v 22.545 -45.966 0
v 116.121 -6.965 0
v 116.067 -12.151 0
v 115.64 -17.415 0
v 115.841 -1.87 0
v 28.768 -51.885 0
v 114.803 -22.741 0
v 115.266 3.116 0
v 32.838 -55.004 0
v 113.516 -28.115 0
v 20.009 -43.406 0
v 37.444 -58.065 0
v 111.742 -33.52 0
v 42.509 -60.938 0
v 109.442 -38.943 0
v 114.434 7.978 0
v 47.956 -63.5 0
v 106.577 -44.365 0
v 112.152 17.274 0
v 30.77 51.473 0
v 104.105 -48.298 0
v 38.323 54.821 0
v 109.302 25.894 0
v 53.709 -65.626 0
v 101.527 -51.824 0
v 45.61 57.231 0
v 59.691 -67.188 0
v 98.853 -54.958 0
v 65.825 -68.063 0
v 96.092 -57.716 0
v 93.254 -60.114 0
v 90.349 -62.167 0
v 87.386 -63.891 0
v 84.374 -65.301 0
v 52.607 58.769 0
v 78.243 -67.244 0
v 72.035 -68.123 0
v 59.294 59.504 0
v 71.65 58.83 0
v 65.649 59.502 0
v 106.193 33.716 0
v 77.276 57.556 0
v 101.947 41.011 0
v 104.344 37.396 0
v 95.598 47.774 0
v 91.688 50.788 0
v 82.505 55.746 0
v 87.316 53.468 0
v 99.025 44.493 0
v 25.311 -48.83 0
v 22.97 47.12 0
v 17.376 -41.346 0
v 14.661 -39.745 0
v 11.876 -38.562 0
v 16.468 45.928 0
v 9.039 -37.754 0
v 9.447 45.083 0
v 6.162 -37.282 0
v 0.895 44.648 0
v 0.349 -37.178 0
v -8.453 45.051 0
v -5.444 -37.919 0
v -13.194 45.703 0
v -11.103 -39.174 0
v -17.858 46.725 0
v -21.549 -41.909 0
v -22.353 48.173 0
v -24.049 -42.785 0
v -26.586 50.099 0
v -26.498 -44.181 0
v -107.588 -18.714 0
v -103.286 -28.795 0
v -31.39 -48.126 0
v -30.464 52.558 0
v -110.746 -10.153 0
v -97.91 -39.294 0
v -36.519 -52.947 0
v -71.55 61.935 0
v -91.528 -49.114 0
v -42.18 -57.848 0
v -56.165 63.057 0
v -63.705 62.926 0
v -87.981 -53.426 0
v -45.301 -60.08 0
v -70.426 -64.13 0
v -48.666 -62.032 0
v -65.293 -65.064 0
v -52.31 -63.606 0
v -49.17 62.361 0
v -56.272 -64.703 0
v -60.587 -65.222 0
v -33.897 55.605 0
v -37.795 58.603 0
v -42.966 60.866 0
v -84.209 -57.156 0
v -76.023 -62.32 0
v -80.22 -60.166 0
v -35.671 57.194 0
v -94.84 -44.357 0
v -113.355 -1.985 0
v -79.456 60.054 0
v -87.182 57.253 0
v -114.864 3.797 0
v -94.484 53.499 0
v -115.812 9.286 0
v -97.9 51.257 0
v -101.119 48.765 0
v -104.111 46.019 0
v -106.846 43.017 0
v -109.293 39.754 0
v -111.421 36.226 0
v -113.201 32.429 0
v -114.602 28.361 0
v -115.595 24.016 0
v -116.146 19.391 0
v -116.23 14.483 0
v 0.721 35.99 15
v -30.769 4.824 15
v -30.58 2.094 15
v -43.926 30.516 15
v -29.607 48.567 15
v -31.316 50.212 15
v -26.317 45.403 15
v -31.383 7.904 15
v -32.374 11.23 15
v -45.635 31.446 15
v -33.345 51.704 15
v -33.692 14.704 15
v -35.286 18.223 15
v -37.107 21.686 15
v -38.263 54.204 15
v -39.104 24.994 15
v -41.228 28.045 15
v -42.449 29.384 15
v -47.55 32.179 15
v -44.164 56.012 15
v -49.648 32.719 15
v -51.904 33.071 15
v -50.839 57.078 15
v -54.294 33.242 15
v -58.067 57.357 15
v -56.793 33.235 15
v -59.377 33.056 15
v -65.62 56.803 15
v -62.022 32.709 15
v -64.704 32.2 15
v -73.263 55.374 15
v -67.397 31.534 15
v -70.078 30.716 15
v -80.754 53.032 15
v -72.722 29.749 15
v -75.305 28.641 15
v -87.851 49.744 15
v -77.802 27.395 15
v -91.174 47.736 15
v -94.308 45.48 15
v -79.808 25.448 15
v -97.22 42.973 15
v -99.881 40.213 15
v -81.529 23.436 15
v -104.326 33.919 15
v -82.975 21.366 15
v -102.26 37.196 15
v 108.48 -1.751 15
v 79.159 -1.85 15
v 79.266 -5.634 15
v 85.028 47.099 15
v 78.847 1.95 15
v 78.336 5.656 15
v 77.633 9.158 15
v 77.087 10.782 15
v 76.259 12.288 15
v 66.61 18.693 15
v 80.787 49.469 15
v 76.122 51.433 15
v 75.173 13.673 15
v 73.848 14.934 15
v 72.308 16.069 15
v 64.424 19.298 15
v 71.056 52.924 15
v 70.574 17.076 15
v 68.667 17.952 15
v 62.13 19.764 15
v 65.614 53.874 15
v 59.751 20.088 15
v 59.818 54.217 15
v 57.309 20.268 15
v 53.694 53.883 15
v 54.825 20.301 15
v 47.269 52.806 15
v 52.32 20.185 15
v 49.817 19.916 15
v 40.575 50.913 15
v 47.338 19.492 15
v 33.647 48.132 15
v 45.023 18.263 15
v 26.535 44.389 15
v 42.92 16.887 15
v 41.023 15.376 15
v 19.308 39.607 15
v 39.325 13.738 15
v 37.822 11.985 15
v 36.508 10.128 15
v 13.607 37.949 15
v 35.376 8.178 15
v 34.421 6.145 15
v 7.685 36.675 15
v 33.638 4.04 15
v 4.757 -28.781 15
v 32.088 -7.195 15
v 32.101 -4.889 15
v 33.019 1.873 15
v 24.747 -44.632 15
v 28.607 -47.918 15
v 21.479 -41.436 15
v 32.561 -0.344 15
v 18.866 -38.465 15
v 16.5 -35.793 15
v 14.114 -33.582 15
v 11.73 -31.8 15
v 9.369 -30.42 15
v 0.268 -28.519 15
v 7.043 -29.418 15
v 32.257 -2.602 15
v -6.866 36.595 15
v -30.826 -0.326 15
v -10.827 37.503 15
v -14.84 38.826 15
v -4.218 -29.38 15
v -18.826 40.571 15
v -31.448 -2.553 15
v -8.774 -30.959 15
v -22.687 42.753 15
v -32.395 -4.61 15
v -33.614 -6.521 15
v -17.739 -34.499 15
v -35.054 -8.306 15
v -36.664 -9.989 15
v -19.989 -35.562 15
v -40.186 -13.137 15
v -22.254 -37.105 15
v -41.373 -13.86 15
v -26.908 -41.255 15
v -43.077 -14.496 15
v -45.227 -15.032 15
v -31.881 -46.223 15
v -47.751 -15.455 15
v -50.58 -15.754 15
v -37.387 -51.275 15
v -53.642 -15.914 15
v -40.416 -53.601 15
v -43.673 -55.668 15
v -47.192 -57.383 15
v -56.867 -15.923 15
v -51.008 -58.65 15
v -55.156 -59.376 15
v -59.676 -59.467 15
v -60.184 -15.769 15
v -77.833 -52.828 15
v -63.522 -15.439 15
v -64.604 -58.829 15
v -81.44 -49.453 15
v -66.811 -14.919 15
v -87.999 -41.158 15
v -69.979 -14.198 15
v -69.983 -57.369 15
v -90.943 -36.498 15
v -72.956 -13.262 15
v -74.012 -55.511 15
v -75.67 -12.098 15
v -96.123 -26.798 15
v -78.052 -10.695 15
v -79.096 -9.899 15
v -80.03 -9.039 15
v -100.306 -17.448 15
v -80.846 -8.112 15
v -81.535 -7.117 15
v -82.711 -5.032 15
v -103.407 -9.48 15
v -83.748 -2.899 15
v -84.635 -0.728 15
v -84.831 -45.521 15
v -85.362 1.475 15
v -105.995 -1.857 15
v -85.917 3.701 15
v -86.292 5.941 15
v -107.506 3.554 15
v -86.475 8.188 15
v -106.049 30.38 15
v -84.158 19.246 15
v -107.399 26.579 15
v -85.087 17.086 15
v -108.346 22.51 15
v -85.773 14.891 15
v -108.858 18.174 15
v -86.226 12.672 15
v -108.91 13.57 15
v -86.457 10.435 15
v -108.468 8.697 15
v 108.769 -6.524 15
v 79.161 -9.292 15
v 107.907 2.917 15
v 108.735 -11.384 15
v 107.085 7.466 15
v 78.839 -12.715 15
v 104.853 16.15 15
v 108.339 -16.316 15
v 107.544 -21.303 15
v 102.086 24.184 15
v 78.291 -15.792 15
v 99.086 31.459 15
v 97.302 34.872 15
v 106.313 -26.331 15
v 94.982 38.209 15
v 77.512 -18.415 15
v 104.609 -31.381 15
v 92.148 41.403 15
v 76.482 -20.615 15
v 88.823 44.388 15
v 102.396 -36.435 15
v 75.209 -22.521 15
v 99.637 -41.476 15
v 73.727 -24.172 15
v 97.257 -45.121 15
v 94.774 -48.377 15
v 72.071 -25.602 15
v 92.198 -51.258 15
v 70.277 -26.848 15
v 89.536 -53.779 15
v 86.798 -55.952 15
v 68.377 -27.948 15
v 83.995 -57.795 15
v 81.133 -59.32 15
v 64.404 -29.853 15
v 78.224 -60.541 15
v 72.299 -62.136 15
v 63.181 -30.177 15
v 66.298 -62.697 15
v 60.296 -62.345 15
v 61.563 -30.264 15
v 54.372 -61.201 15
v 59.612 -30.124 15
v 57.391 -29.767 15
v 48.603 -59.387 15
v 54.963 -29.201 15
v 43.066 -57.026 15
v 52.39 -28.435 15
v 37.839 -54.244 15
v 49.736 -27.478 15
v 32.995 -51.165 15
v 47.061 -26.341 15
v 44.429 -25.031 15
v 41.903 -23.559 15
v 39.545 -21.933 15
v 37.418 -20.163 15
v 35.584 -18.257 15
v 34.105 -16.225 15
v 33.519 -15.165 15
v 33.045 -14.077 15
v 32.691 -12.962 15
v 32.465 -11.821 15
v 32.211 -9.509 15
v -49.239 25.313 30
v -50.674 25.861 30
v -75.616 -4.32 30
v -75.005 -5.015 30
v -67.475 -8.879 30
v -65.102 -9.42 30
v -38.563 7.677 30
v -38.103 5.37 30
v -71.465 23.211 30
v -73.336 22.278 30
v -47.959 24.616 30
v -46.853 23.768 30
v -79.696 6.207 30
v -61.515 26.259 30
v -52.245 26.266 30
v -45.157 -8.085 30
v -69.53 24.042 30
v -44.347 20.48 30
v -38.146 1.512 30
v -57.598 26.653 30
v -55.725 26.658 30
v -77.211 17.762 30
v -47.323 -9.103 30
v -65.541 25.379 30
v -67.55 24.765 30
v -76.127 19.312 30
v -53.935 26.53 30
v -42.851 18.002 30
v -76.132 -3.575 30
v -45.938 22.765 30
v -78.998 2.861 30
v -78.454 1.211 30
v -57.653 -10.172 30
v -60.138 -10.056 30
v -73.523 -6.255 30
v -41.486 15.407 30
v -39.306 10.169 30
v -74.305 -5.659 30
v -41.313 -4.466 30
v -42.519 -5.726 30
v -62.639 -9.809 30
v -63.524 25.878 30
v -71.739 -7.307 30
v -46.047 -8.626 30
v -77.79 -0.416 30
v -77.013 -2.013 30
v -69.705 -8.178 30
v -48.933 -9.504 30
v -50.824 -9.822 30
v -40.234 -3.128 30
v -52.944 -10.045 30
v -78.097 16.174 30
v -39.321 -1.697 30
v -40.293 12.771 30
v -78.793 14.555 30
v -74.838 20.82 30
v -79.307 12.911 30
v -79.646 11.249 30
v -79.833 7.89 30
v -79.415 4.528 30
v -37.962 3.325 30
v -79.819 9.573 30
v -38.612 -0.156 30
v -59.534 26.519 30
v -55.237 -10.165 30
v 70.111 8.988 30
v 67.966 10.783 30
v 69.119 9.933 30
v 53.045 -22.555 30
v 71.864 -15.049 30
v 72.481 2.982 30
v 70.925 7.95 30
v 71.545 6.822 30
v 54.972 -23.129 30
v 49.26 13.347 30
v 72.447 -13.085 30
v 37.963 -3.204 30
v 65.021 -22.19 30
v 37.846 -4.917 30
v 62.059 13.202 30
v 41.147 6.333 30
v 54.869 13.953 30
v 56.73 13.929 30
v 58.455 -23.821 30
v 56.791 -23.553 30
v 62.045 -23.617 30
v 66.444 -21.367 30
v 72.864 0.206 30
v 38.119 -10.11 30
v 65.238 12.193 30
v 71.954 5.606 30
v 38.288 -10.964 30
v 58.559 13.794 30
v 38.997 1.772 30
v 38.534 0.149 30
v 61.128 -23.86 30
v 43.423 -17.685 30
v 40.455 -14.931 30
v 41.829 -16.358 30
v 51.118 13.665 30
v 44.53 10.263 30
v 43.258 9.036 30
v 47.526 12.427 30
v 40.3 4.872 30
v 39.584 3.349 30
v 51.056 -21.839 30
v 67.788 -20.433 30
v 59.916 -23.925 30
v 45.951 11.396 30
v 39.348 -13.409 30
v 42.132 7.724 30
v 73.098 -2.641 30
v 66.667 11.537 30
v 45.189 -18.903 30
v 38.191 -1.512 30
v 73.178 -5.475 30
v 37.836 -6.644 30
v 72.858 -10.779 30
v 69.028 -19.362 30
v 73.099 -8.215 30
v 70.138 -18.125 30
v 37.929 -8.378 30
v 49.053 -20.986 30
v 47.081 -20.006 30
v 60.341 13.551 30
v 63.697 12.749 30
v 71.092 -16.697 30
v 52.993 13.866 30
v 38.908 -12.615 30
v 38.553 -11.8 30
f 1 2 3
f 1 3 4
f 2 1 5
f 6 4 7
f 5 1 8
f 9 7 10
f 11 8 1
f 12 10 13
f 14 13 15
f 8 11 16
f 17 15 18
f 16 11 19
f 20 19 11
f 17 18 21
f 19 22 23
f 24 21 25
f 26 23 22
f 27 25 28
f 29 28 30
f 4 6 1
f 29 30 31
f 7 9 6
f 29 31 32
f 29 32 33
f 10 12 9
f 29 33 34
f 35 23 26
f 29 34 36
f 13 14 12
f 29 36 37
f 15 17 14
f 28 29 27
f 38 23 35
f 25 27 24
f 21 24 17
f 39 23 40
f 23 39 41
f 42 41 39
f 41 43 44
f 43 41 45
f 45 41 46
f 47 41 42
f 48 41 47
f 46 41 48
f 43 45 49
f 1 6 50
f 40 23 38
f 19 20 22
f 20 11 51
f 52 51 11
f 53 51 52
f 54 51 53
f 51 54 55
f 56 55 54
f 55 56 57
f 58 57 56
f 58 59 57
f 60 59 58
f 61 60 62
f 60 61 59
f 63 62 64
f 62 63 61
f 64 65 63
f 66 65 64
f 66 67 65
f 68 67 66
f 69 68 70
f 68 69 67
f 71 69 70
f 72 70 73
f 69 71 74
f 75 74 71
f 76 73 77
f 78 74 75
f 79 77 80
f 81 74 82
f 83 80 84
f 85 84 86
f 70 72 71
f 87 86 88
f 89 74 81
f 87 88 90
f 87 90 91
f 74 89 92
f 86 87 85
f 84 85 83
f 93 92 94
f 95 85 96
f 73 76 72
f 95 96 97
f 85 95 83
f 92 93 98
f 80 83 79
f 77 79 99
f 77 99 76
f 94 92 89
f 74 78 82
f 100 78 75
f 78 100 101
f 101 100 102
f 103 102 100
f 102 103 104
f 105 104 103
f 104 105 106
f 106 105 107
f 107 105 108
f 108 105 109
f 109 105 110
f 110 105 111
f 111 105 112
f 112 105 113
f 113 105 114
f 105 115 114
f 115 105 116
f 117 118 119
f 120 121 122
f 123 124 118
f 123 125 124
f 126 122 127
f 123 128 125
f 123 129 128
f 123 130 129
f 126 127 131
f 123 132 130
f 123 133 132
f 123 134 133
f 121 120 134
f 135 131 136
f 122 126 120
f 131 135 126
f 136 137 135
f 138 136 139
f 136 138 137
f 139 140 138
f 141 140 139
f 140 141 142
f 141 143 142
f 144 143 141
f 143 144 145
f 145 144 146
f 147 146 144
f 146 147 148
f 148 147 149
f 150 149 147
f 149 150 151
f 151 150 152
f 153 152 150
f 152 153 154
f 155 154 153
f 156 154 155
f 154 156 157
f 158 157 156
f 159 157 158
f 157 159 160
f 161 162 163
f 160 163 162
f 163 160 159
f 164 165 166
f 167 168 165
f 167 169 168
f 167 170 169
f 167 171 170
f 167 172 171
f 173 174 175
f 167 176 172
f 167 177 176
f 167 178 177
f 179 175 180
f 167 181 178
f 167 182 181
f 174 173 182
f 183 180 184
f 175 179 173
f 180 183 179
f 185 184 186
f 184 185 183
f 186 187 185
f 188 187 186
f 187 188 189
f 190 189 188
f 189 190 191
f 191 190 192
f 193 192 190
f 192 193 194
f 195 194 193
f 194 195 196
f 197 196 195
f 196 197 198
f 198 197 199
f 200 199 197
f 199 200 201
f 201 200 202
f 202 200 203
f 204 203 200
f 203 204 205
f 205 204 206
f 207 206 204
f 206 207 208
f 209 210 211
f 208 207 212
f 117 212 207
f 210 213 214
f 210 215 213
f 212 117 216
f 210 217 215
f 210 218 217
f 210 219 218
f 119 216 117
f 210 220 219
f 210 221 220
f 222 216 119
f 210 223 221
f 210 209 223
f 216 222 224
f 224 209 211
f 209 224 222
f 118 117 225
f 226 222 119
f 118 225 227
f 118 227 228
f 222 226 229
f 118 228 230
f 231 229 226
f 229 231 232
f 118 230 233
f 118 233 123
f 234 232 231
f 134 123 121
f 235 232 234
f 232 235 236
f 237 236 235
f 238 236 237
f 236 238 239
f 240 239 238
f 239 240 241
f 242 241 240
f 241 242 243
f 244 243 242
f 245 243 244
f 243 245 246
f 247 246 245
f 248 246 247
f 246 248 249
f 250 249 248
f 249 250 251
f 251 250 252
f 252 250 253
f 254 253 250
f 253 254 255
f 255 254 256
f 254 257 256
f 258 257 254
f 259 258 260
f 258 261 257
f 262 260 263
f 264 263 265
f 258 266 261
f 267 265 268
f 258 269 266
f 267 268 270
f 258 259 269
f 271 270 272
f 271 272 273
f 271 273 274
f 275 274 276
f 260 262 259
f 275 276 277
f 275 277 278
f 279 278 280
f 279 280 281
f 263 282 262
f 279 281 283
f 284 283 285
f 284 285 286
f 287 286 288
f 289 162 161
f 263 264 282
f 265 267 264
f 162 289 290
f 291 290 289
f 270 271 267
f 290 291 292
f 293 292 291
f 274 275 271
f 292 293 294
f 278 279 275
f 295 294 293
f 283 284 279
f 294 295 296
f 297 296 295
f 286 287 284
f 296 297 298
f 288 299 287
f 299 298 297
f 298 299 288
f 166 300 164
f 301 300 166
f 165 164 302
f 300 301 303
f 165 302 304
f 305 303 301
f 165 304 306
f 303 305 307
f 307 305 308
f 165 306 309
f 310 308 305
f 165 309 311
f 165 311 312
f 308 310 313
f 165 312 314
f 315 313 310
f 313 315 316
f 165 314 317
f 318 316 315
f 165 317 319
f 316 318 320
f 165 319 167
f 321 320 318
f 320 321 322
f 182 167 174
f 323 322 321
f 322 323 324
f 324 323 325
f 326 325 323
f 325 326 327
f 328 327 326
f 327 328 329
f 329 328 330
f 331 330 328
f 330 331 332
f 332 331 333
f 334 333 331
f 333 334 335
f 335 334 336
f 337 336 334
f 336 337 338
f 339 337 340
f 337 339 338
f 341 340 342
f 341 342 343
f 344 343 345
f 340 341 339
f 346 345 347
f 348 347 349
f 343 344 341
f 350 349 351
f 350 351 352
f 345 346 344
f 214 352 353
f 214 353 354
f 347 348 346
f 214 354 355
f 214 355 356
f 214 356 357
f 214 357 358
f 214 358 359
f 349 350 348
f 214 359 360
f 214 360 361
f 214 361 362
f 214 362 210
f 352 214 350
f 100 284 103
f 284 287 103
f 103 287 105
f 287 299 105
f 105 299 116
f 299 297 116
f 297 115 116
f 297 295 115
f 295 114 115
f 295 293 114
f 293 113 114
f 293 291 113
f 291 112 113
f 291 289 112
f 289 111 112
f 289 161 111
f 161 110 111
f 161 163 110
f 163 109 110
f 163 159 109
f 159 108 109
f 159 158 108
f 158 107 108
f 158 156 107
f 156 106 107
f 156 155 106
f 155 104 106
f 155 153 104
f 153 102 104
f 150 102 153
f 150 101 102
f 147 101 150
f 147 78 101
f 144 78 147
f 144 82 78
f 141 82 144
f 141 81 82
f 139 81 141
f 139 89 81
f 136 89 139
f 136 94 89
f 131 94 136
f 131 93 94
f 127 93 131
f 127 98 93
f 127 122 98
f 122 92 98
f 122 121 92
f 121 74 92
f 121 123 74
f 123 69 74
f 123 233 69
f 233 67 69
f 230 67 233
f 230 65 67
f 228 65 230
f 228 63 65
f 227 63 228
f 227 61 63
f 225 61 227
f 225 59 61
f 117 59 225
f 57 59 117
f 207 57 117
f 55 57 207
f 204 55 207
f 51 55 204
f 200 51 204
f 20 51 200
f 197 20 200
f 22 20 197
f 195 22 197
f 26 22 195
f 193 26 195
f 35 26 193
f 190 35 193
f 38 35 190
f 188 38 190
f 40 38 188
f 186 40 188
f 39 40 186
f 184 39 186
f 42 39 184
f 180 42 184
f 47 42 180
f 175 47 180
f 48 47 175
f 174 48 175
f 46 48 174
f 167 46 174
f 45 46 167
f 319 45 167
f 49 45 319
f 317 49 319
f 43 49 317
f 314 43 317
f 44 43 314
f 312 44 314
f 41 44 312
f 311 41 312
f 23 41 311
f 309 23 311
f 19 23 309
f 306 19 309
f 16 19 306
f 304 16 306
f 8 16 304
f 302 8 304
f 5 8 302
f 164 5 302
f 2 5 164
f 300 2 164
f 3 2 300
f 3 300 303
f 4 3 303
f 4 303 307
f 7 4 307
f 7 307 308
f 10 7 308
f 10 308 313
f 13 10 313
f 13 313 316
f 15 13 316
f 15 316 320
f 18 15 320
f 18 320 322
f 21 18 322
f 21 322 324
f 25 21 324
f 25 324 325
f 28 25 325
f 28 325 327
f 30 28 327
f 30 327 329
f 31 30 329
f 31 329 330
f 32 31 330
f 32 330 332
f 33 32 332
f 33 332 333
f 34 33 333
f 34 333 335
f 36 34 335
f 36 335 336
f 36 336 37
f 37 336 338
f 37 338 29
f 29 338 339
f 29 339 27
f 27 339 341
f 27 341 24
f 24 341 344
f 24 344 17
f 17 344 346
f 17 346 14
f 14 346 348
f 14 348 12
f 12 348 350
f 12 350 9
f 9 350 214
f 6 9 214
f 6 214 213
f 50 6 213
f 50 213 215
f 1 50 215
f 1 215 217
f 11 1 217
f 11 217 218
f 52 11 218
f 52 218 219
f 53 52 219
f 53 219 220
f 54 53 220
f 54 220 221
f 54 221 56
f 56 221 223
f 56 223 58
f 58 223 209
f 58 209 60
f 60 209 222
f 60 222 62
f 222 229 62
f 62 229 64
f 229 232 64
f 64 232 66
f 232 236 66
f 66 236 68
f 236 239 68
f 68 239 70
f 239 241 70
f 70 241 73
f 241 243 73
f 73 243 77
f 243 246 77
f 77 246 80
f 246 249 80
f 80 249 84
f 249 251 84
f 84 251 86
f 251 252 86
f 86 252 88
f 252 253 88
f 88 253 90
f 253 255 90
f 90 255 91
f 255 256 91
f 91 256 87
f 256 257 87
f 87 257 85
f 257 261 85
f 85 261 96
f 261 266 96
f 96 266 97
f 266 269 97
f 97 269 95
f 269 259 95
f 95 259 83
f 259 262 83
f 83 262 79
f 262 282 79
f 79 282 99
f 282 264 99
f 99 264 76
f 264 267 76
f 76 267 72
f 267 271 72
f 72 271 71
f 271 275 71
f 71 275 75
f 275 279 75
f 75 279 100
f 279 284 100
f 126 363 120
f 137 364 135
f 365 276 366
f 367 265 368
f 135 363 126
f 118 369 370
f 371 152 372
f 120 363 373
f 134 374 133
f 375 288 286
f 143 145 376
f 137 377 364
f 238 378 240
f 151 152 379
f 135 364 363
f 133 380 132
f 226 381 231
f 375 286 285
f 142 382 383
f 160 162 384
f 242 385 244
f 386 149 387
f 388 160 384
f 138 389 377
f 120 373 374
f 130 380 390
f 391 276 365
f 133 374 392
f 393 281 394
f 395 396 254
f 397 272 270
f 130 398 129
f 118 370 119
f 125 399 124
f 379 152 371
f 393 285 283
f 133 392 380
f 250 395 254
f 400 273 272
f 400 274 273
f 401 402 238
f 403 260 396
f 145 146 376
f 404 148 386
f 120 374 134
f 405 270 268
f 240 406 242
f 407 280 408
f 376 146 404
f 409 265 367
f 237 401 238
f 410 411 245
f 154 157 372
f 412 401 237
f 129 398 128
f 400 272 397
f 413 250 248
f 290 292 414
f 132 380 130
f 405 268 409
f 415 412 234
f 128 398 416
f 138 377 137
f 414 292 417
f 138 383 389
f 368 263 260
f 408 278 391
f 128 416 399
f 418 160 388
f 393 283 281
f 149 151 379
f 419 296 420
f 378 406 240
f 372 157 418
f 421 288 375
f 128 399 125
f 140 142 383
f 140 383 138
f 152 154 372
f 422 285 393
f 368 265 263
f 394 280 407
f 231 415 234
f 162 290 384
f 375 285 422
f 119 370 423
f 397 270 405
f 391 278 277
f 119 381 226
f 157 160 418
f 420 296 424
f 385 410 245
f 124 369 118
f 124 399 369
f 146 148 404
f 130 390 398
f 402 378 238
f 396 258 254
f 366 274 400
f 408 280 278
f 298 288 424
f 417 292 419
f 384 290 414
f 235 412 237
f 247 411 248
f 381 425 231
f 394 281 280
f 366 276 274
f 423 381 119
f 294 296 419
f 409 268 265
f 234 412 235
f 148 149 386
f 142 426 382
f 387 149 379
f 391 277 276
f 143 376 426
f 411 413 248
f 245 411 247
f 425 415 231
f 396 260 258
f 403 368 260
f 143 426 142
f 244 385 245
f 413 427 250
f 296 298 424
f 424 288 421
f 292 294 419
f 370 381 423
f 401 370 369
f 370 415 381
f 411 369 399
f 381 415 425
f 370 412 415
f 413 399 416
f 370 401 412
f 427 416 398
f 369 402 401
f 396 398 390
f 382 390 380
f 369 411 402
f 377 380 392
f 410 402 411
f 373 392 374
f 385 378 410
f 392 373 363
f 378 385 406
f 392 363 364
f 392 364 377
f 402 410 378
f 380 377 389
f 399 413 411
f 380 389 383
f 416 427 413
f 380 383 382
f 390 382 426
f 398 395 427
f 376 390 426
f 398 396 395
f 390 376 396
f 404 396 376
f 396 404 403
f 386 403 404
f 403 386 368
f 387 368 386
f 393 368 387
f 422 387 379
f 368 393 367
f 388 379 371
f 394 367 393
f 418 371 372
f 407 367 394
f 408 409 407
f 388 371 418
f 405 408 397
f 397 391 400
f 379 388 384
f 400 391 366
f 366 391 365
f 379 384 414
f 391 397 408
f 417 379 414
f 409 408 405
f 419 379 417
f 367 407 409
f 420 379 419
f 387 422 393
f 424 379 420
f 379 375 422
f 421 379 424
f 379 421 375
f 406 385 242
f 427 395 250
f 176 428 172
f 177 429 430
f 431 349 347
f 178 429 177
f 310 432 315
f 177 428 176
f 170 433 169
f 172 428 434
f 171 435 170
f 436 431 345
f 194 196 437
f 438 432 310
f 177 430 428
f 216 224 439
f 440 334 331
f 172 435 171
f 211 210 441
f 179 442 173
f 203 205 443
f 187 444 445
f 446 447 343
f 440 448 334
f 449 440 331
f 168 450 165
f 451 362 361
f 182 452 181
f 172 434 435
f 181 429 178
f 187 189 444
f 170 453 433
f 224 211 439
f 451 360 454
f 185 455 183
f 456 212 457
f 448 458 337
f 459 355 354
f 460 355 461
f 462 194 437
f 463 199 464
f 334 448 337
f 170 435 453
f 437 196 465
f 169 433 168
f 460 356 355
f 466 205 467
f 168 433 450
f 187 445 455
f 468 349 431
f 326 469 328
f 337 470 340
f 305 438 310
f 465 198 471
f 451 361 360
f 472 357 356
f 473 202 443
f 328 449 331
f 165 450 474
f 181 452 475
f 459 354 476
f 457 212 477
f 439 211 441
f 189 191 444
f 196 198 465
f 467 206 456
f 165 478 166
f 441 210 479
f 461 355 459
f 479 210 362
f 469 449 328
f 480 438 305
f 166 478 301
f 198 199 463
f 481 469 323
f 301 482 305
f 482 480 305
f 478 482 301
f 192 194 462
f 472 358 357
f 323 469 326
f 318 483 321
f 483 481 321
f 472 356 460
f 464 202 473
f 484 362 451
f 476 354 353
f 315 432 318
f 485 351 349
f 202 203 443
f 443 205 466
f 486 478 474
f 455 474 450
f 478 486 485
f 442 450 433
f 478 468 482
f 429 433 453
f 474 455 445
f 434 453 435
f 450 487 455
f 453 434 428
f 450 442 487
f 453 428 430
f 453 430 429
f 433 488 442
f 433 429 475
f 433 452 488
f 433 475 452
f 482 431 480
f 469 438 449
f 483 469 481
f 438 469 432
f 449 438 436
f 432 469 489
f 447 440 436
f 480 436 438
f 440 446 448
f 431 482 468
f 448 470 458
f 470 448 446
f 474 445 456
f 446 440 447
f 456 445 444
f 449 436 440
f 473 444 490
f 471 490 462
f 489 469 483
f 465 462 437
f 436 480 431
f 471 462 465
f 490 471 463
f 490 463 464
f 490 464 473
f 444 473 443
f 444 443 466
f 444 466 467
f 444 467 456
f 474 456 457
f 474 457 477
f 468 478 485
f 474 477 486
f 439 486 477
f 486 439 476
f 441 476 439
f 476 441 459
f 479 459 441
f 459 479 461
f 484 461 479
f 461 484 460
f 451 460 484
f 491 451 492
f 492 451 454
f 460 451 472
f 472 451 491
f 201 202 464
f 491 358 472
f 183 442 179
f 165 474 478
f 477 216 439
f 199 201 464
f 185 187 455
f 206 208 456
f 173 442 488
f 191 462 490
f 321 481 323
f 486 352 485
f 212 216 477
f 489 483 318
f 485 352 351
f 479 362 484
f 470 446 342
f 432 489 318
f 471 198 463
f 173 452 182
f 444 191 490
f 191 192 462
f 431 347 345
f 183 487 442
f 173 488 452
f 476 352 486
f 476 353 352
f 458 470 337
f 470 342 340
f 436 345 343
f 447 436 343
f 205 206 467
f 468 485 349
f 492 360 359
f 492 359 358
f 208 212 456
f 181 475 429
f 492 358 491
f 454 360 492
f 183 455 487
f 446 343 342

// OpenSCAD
// file: hill-4.scad
use <hillpolygon.scad>

% translate([0,0,155/2]) cube(size=[240, 153, 155], center=true); 

hill4();

module hill4() {
   hillFromPolygon(angle=25) hill4Polygon();
}

// Note: There is something slightly amiss with this polygon, resulting hill ends up with two
//       volumes (?).
module hill4Polygon() {
   // Apologies for the hackish adjustments ... just wanted to get the job done!
   translate([-10,0,0]) rotate([0,0,55]) translate([75,-10,0]) scale([0.8,0.8]) 
      polygon(points=
         [[-140.478, 124.045], [-137.230, 125.810], [-133.814, 127.261],
         [-130.249, 128.407], [-126.551, 129.260], [-118.827, 130.135],
         [-110.782, 129.975], [-102.554, 128.873], [-94.282, 126.918],
         [-86.104, 124.202], [-78.161, 120.815], [-70.590, 116.849],
         [-63.530, 112.395], [-57.120, 107.543], [-51.500, 102.384],
         [-46.807, 97.010], [-43.182, 91.511], [-40.761, 85.978], [-40.047,
         83.228], [-39.685, 80.503], [-38.803, 70.788], [-37.372, 61.707],
         [-35.232, 53.266], [-32.221, 45.469], [-30.339, 41.813], [-28.180,
         38.321], [-25.722, 34.993], [-22.947, 31.830], [-19.833, 28.831],
         [-16.361, 25.998], [-12.511, 23.332], [-8.262, 20.833], [-3.699,
         18.030], [1.024, 14.503], [5.824, 10.330], [10.615, 5.590],
         [15.315, 0.361], [19.839, -5.279], [24.103, -11.252], [28.023,
         -17.479], [31.515, -23.882], [34.496, -30.382], [36.880, -36.903],
         [38.583, -43.364], [39.523, -49.689], [39.615, -55.798], [38.774,
         -61.614], [36.917, -67.058], [35.046, -70.725], [32.867, -74.217],
         [30.379, -77.524], [27.585, -80.639], [24.484, -83.556], [21.077,
         -86.264], [17.366, -88.758], [13.350, -91.029], [9.031, -93.069],
         [4.409, -94.871], [-0.514, -96.427], [-5.739, -97.729], [-11.264,
         -98.769], [-17.089, -99.539], [-23.213, -100.032], [-29.635,
         -100.240], [-39.310, -100.153], [-48.272, -99.722], [-56.565,
         -98.983], [-64.233, -97.967], [-71.320, -96.710], [-77.870,
         -95.245], [-89.537, -91.828], [-99.587, -87.986], [-108.374,
         -83.990], [-123.572, -76.623], [-129.392, -73.760], [-134.677,
         -70.651], [-139.458, -67.328], [-143.761, -63.822], [-147.618,
         -60.167], [-151.056, -56.395], [-154.105, -52.536], [-156.794,
         -48.625], [-161.207, -40.769], [-164.527, -33.084], [-166.987,
         -25.828], [-168.818, -19.258], [-170.193, -13.243], [-171.281,
         -6.864], [-172.108, 0.055], [-172.700, 7.691], [-173.288,
         25.811], [-173.262, 48.900], [-173.153, 59.445], [-172.757,
         69.740], [-171.648, 79.745], [-170.692, 84.627], [-169.398,
         89.422], [-167.713, 94.124], [-165.583, 98.729], [-162.955,
         103.233], [-159.776, 107.629], [-155.992, 111.913], [-151.550,
         116.081], [-146.396, 120.126], [-140.478, 124.045]]
      , paths=
         [[0, 1, 2, 3, 4, 5, 6, 7, 8, 9, 10, 11, 12, 13, 14, 15, 16, 17,
         18, 19, 20, 21, 22, 23, 24, 25, 26, 27, 28, 29, 30, 31, 32, 33,
         34, 35, 36, 37, 38, 39, 40, 41, 42, 43, 44, 45, 46, 47, 48, 49,
         50, 51, 52, 53, 54, 55, 56, 57, 58, 59, 60, 61, 62, 63, 64, 65,
         66, 67, 68, 69, 70, 71, 72, 73, 74, 75, 76, 77, 78, 79, 80, 81,
         82, 83, 84, 85, 86, 87, 88, 89, 90, 91, 92, 93, 94, 95, 96, 97,
         98, 99, 100, 101, 102, 103, 104, 0]]
    );}
// file: hill-5.scad
use <hillpolygon.scad>;

% translate([0,0,155/2]) cube(size=[240, 153, 155], center=true);

hill5();

module hill5() {
   hillFromPolygon(angle=25) hill5Polygon();
}

module hill5Polygon() {
	rotate([0,0,30]) translate([55,-15,0])
  polygon(points=
    [[-39.685, 80.503], [-33.602, 77.830], [-27.700, 74.829], [-22.013, 71.501], [-16.577, 67.848], [-11.425, 63.870], [-6.592, 59.569], [-2.114, 54.944], [1.976, 49.998], [5.642, 44.731], [8.851, 39.145], [11.567, 33.240], [13.756, 27.017], [15.384, 20.477], [16.415, 13.623], [16.815, 6.453], [16.549, -1.030], [14.055, -7.770], [11.144, -14.347], [7.855, -20.711], [4.224, -26.811], [0.290, -32.597], [-3.911, -38.020], [-8.340, -43.029], [-12.960, -47.574], [-17.734, -51.605], [-22.624, -55.073], [-27.593, -57.926], [-32.602, -60.115], [-37.615, -61.590], [-42.594, -62.300], [-47.502, -62.196], [-52.300, -61.228], [-61.971, -57.963], [-71.871, -53.933], [-81.720, -49.278], [-91.235, -44.137], [-100.137, -38.652], [-108.144, -32.964], [-114.977, -27.212], [-120.353, -21.538], [-124.325, -15.847], [-127.224, -9.973], [-129.190, -3.949], [-130.364, 2.191], [-130.884, 8.412], [-130.892, 14.682], [-129.929, 27.234], [-128.983, 30.724], [-126.888, 34.853], [-123.755, 39.481], [-119.698, 44.465], [-114.828, 49.664], [-109.258, 54.935], [-103.099, 60.138], [-96.463, 65.131], [-89.464, 69.772], [-82.212, 73.919], [-74.820, 77.431], [-67.400, 80.166], [-60.065, 81.982], [-52.926, 82.738], [-49.465, 82.674], [-46.095, 82.292], [-42.831, 81.574]]
    , paths=
    [[0, 1, 2, 3, 4, 5, 6, 7, 8, 9, 10, 11, 12, 13, 14, 15, 16, 17, 18, 19, 20, 21, 22, 23, 24, 25, 26, 27, 28, 29, 30, 31, 32, 33, 34, 35, 36, 37, 38, 39, 40, 41, 42, 43, 44, 45, 46, 47, 48, 49, 50, 51, 52, 53, 54, 55, 56, 57, 58, 59, 60, 61, 62, 63, 64, 0, 0]]
    );
}
// file: hillpolygon.scad
module hillFromPolygon(height = 23, angle = 30, convexity = 5) {
   $fn = 100;

   // estRadius calculates an estimated radius for the hill assuming that I've filled most of the
   // depth of the build plate (Y dimension) with the polygon. This is then used to scale the roof of
   // the polyhedral.
   estRadius = 0.95 * 150 / 2;
   inset = height * tan(angle);
   scaleFactor = (estRadius - inset) / estRadius;

   linear_extrude(height = height, convexity = convexity, scale=scaleFactor) child(0);
}
// main file
use <hillpolygon.scad>
use <hill-2.scad>
use <hill-5.scad>
use <hill-4.scad>

% translate([0,0,155/2]) cube(size=[240, 153, 155], center=true); 

// cube([35,35,35,]);

scale([.85,1,1]) hill2Polyhedron(height=15, angle=30);

translate([-60,7,15]) scale([.4,.35,1]) rotate([0,0,110]) hillFromPolygon(angle=50,height=15) hill5Polygon();
translate([55,-5,15]) rotate([0,0,90]) scale([.35,.35,1]) hillFromPolygon(angle=50,height=15) hill5Polygon();
